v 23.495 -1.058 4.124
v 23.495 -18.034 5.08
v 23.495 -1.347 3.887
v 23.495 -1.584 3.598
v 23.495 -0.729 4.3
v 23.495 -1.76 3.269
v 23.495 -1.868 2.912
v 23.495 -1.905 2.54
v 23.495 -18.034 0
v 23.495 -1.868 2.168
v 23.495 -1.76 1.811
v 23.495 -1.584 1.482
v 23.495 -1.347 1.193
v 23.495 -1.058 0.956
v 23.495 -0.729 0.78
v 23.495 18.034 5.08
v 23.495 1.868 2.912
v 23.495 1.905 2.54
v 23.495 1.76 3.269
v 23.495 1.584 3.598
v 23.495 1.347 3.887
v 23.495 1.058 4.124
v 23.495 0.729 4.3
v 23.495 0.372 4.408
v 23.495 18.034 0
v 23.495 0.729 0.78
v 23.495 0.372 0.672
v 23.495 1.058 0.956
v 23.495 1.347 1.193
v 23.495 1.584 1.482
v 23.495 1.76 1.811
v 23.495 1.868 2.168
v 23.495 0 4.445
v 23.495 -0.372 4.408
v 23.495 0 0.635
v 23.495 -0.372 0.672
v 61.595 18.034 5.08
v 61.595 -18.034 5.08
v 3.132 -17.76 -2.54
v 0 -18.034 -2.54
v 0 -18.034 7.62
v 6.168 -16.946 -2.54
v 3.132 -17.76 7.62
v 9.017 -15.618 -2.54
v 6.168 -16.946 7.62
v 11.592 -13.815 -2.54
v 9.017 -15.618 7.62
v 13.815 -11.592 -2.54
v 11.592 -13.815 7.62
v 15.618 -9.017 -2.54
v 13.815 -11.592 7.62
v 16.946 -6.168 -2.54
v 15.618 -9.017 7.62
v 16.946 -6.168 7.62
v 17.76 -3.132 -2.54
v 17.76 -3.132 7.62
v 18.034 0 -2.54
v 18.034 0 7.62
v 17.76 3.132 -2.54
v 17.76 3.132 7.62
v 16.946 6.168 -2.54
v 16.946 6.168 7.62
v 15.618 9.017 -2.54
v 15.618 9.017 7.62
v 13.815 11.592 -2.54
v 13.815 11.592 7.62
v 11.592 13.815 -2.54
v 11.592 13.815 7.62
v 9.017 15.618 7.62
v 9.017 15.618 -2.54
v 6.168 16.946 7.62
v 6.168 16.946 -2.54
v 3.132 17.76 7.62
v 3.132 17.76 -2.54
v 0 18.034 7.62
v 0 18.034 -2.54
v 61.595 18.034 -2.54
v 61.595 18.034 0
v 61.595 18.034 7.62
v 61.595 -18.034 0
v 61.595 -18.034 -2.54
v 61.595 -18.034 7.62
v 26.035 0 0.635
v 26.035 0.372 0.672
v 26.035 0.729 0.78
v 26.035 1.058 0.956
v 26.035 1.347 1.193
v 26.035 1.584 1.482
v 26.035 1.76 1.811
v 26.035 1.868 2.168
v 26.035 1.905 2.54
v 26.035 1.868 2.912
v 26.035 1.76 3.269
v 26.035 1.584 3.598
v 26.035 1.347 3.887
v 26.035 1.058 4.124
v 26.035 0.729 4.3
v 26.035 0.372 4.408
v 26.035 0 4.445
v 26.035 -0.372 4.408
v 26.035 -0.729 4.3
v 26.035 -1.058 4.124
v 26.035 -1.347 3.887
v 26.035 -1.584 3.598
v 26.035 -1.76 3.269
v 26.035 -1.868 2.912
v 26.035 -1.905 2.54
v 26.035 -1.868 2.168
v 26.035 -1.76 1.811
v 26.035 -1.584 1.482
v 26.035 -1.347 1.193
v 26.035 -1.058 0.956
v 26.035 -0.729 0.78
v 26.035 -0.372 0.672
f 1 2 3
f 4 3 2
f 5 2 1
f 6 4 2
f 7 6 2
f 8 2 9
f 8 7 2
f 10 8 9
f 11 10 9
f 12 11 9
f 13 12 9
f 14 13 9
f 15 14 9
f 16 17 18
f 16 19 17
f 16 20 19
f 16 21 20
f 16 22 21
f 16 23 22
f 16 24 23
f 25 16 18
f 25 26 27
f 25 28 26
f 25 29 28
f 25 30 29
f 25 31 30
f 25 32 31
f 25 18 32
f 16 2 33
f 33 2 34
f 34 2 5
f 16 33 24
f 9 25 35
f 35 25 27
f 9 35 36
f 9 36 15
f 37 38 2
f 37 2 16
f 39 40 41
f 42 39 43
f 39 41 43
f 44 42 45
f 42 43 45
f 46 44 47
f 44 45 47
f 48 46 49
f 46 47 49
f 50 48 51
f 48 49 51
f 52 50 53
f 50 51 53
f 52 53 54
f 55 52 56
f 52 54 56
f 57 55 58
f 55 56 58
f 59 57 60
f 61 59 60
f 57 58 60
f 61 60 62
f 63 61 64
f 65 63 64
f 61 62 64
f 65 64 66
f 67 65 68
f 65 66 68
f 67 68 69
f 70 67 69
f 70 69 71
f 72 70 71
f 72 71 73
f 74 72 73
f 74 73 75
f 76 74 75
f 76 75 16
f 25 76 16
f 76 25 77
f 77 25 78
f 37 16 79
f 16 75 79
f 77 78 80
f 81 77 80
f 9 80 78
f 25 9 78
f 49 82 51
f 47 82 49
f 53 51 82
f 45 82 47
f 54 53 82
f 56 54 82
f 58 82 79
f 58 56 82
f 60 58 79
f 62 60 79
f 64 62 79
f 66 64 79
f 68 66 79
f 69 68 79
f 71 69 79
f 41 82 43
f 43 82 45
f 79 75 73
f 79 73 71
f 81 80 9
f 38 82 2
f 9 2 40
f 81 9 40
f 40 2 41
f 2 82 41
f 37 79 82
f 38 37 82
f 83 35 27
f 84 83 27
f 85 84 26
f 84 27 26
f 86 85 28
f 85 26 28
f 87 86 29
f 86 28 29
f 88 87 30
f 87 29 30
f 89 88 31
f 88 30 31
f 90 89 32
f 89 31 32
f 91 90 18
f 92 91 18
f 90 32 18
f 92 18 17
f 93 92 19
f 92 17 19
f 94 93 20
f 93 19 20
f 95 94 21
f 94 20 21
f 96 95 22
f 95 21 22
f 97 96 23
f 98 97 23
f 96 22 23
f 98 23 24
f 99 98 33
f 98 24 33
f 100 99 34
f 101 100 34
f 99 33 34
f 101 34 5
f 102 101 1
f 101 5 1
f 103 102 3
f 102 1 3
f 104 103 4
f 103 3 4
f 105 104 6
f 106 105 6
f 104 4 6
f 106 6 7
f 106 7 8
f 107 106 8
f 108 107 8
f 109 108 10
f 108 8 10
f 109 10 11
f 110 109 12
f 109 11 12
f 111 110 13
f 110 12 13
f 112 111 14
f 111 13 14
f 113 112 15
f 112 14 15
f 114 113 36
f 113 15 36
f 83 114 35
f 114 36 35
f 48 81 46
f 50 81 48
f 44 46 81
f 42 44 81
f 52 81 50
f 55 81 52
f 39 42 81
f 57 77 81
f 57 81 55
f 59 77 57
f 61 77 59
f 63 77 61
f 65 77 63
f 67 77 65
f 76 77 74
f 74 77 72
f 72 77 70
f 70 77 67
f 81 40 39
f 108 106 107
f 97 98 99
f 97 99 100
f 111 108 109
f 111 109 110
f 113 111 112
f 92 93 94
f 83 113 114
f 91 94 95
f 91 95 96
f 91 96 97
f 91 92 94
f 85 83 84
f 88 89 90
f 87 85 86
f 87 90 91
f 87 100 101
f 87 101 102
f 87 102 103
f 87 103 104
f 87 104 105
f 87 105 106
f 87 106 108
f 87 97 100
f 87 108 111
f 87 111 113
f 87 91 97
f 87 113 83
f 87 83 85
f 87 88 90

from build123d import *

# Parameters (mm, degrees)
SKETCH1_R               = 19.939
CIRCLE_EXTRUDE_DEPTH    = 7.62
SKETCH3_W               = 7.62
SKETCH3_H               = 39.878
RECTANGLE_EXTRUDE_DEPTH = 63.5
SKETCH2_R               = 18.034
CRICLE_CUT_DEPTH        = 67.991627245
SKETCH4_OUTSIDE_W       = 103.997
SKETCH4_OUTSIDE_H       = 60.436
SKETCH4_OUTSIDE_W_2     = 61.595
SKETCH4_OUTSIDE_H_2     = 36.068
FRAME_CUT_DEPTH         = 67.991627245
EXTENSION_DEPTH         = 2.54
SKETCH13_W              = 5.08
SKETCH13_H              = 36.068
CUT_EXTRUDE1_DEPTH      = 38.1
SKETCH14_R              = 1.905
BOSS_EXTRUDE3_DEPTH     = 2.54


with BuildPart() as part:
    # Sketch1 → circle extrude (new body)
    with BuildSketch(Plane.XY):
        with Locations(Location((0, 0, 0), (0, 0, 180))):
            Circle(SKETCH1_R)
    extrude(amount=CIRCLE_EXTRUDE_DEPTH)

    # Sketch3 → rectangle extrude (add)
    with BuildSketch(Plane(origin=(0, 0, 0), x_dir=(0, 0, -1), z_dir=(1, 0, 0))):
        with Locations((-3.81, 0)):
            Rectangle(SKETCH3_W, SKETCH3_H)
    extrude(amount=RECTANGLE_EXTRUDE_DEPTH)

    # Sketch2 → cricle cut (cut, through all)
    with BuildSketch(Plane.XY.offset(7.62)):
        Circle(SKETCH2_R)
    extrude(amount=-CRICLE_CUT_DEPTH, mode=Mode.SUBTRACT)

    # Sketch4 outside → frame cut (cut, through all)
    with BuildSketch(Plane.XY.offset(7.62)):
        with Locations((21.7805, 0)):
            Rectangle(SKETCH4_OUTSIDE_W, SKETCH4_OUTSIDE_H)
        with Locations((30.7975, 0)):
            Rectangle(SKETCH4_OUTSIDE_W_2, SKETCH4_OUTSIDE_H_2, mode=Mode.SUBTRACT)
    extrude(amount=-FRAME_CUT_DEPTH, mode=Mode.SUBTRACT)

    # Sketch10 → extension (add)
    with BuildSketch(Plane(origin=(0, 0, 0), x_dir=(-1, 0, 0), z_dir=(0, 0, -1))):
        with BuildLine():
            Line((0, 18.034), (-61.595, 18.034))
            Line((-61.595, 18.034), (-61.595, -18.034))
            Line((-61.595, -18.034), (0, -18.034))
            ThreePointArc((0, -18.034), (-18.034, 0), (0, 18.034))
        make_face()
    extrude(amount=EXTENSION_DEPTH)

    # Sketch13 → Cut-Extrude1 (cut)
    with BuildSketch(Plane(origin=(61.595, 0, 0), x_dir=(0, 0, -1), z_dir=(1, 0, 0))):
        with Locations((-2.54, 0)):
            Rectangle(SKETCH13_W, SKETCH13_H)
    extrude(amount=-CUT_EXTRUDE1_DEPTH, mode=Mode.SUBTRACT)

    # Sketch14 → Boss-Extrude3 (add)
    with BuildSketch(Plane(origin=(23.495, 0, 0), x_dir=(0, 0, -1), z_dir=(1, 0, 0))):
        with Locations((-2.54, 0)):
            Circle(SKETCH14_R)
    extrude(amount=BOSS_EXTRUDE3_DEPTH)


solid = part.part
